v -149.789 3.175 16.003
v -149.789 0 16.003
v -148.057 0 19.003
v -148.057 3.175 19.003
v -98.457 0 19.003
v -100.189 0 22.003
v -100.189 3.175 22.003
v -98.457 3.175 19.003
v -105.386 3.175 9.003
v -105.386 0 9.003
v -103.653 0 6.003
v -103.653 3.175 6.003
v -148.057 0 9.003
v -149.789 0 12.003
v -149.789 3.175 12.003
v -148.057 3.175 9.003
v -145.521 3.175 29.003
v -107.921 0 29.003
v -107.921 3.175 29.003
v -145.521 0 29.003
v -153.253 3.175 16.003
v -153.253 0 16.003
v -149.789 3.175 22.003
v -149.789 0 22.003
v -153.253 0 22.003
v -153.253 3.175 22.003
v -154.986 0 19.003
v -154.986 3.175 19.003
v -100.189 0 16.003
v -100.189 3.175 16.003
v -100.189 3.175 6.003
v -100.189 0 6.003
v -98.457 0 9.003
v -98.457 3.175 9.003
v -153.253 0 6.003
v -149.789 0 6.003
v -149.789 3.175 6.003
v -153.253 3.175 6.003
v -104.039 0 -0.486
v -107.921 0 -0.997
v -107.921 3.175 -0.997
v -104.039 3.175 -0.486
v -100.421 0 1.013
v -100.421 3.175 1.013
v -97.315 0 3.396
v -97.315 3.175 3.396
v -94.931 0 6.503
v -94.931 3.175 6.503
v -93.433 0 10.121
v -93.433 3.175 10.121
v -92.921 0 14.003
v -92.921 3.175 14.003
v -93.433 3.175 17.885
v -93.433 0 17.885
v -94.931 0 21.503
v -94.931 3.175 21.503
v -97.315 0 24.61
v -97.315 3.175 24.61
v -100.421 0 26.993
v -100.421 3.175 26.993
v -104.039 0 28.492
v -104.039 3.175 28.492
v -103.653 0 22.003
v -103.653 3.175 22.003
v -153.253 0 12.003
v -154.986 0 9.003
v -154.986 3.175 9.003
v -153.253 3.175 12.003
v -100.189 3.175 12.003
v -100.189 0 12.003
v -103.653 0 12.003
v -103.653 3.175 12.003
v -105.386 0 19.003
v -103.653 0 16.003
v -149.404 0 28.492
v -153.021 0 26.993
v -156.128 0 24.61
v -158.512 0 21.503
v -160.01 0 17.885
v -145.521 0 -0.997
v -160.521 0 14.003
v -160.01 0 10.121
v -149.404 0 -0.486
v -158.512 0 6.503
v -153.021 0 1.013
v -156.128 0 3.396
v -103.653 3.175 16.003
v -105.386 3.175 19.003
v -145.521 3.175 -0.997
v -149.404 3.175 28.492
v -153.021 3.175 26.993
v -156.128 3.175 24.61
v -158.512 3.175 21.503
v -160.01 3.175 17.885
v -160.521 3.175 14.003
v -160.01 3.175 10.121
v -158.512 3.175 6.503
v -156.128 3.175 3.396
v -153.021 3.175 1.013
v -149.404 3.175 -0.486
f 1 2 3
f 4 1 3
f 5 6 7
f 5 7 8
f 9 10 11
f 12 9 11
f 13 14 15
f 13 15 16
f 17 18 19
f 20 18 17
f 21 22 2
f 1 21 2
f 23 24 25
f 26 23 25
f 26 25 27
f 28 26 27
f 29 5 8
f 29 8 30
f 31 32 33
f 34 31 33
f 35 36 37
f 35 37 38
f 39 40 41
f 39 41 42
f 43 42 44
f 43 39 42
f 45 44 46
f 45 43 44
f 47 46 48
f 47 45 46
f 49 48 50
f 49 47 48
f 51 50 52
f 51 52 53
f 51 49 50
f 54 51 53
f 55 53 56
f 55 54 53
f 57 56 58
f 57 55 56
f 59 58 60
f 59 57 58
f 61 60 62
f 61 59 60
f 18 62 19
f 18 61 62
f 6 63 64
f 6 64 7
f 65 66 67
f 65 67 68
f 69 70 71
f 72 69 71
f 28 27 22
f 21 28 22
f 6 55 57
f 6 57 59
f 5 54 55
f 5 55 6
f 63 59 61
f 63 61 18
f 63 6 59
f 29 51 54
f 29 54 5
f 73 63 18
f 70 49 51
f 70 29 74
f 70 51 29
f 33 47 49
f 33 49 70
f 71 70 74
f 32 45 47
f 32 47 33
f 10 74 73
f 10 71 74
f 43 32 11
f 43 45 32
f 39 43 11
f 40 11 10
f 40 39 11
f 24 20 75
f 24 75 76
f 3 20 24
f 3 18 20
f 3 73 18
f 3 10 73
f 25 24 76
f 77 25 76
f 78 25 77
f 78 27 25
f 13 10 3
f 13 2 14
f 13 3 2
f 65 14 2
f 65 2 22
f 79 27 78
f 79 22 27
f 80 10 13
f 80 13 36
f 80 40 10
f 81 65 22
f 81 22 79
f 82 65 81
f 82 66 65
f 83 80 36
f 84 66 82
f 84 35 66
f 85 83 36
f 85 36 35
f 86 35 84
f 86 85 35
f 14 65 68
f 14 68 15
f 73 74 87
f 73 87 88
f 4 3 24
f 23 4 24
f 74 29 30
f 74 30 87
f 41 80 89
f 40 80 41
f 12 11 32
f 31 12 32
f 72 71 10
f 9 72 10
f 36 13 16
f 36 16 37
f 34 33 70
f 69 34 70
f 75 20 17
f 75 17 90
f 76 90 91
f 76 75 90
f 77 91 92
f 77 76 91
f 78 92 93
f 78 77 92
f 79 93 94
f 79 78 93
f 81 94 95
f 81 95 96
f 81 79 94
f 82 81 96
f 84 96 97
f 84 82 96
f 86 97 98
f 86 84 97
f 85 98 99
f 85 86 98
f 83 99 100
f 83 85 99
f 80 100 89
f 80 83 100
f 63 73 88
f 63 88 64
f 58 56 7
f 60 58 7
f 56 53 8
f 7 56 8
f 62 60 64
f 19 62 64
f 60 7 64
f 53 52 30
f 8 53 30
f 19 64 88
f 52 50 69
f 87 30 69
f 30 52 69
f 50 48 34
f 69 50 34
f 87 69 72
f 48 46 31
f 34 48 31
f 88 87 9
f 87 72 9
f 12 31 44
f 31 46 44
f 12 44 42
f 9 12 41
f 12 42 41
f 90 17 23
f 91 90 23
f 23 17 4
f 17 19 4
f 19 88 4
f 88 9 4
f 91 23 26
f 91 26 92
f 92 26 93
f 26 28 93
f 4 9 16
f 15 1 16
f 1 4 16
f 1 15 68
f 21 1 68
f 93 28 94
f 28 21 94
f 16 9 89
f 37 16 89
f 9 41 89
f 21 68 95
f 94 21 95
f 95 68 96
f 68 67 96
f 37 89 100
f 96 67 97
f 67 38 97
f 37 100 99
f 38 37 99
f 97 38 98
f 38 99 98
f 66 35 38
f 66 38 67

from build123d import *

# Parameters (mm, degrees)
BOSS_EXTRUDE1_DEPTH = 3.175


with BuildPart() as part:
    # Sketch2 → Boss-Extrude1 (new body)
    with BuildSketch(Plane(origin=(0, 0, 0), x_dir=(1, 0, 0), z_dir=(0, 1, 0))):
        with BuildLine():
            Line((-145.521414695, 0.997059393), (-107.921414695, 0.997059393))
            ThreePointArc((-107.921414695, 0.997059393), (-92.921414695, -14.002940607), (-107.921414695, -29.002940607))
            Line((-107.921414695, -29.002940607), (-145.521414695, -29.002940607))
            ThreePointArc((-145.521414695, -29.002940607), (-160.521414695, -14.002940607), (-145.521414695, 0.997059393))
        make_face()
        Polygon((-149.789363887, -12.002940607), (-148.05731308, -9.002940607), (-149.789363887, -6.002940607), (-153.253465503, -6.002940607), (-154.98551631, -9.002940607), (-153.253465503, -12.002940607), align=None, mode=Mode.SUBTRACT)
        Polygon((-153.253465503, -16.002940607), (-149.789363887, -16.002940607), (-148.05731308, -19.002940607), (-149.789363887, -22.002940607), (-153.253465503, -22.002940607), (-154.98551631, -19.002940607), align=None, mode=Mode.SUBTRACT)
        Polygon((-103.653465503, -16.002940607), (-105.38551631, -19.002940607), (-103.653465503, -22.002940607), (-100.189363887, -22.002940607), (-98.45731308, -19.002940607), (-100.189363887, -16.002940607), align=None, mode=Mode.SUBTRACT)
        Polygon((-100.189363887, -12.002940607), (-103.653465503, -12.002940607), (-105.38551631, -9.002940607), (-103.653465503, -6.002940607), (-100.189363887, -6.002940607), (-98.45731308, -9.002940607), align=None, mode=Mode.SUBTRACT)
    extrude(amount=BOSS_EXTRUDE1_DEPTH)


solid = part.part
